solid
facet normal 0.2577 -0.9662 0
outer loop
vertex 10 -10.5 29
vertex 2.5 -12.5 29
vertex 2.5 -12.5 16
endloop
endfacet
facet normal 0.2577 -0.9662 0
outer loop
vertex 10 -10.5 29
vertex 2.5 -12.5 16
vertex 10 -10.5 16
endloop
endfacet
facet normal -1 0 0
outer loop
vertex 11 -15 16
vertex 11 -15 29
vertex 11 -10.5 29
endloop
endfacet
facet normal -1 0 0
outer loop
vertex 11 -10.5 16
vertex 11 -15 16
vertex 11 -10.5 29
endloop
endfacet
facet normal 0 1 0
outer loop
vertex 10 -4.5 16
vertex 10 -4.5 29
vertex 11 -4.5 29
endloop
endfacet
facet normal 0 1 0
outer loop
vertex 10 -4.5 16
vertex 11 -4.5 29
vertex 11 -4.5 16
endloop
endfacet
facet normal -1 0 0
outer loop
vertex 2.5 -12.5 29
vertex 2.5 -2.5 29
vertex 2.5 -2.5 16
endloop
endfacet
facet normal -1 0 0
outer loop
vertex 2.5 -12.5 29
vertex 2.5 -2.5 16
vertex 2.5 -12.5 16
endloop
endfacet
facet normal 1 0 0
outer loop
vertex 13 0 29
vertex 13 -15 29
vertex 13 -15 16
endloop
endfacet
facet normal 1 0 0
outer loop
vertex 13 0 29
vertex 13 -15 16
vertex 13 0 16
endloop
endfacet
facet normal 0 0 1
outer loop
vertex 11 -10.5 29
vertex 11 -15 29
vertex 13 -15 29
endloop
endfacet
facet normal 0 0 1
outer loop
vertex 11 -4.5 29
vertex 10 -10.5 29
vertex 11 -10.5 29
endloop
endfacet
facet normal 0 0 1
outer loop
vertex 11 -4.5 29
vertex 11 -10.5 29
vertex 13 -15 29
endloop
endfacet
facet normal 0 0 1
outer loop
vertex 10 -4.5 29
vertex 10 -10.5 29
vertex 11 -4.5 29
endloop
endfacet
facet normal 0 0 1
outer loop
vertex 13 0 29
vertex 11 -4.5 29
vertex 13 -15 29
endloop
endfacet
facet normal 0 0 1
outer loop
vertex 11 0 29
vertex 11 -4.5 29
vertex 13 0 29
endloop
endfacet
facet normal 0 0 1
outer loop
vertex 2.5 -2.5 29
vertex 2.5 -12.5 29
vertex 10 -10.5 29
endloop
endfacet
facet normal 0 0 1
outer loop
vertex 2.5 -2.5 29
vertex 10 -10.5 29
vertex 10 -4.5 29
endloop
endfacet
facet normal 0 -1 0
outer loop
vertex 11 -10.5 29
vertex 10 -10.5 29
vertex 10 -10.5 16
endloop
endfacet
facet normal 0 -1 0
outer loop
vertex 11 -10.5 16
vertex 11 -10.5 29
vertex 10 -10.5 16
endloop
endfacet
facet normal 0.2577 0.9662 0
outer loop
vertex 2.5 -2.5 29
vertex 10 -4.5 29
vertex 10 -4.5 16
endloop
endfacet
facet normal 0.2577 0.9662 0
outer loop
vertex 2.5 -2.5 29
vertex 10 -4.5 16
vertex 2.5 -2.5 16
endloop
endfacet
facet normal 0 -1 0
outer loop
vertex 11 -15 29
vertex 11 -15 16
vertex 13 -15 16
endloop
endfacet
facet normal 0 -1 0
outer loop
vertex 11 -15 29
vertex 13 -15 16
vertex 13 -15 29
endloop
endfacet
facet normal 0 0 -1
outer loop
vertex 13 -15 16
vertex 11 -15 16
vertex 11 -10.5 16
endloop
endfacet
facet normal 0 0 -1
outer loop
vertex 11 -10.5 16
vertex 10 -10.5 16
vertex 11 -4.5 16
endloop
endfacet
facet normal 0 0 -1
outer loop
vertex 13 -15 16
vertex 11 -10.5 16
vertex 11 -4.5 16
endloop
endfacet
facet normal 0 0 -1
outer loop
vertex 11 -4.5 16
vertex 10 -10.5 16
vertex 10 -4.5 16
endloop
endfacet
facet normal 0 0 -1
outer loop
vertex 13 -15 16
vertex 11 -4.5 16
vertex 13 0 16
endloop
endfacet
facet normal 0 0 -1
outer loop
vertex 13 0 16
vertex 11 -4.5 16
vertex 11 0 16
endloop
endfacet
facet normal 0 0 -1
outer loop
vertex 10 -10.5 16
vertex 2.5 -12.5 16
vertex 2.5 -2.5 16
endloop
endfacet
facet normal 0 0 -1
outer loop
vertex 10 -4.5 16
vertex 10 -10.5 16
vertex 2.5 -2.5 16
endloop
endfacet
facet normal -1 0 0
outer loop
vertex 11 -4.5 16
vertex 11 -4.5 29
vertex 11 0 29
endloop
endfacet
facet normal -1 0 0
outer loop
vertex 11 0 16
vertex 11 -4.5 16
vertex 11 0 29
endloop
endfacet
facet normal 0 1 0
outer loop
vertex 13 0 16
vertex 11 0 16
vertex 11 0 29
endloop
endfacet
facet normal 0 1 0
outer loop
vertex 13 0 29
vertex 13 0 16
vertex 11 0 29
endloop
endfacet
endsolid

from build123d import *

# Parameters (mm, degrees)
SKETCH023_W       = 10
SKETCH023_H       = 15
PAD013_DEPTH      = 13
POCKET010_DEPTH   = 13.001
POCKET010_FACE1_W = 6
POCKET010_FACE1_H = 13
PAD014_DEPTH      = 1
SKETCH026_W       = 15
SKETCH026_H       = 13
PAD015_DEPTH      = 2


with BuildPart() as part:
    # Sketch023 → Pad013 (new body)
    with BuildSketch(Plane.XY):
        with Locations((5, -7.5)):
            Rectangle(SKETCH023_W, SKETCH023_H)
    extrude(amount=PAD013_DEPTH)

    # Sketch025 (on Face6 of Pad013) → Pocket010 (cut, through all)
    with BuildSketch(Plane.XY.offset(13)):
        Polygon((10, -4.5), (2.5, -2.5), (2.5, -12.5), (10, -10.5), (10, -15), (0, -15), (0, 0), (10, 0), align=None)
    extrude(amount=-POCKET010_DEPTH, mode=Mode.SUBTRACT)

    # Pocket010 Face1 → Pad014 (add)
    with BuildSketch(Plane(origin=(10, -7.5, 6.5), x_dir=(0, -1, 0), z_dir=(1, 0, 0))):
        Rectangle(POCKET010_FACE1_W, POCKET010_FACE1_H)
    extrude(amount=PAD014_DEPTH)

    # Sketch026 (on Face6 of Pad014) → Pad015 (join)
    with BuildSketch(Plane.YZ.offset(11)):
        with Locations((-7.5, 6.5)):
            Rectangle(SKETCH026_W, SKETCH026_H)
    extrude(amount=PAD015_DEPTH)


with BuildPart() as part_1:
    # Body004 placement: moved
    add(part.part.moved(Location((0, 0, 16))))


solid = part_1.part
